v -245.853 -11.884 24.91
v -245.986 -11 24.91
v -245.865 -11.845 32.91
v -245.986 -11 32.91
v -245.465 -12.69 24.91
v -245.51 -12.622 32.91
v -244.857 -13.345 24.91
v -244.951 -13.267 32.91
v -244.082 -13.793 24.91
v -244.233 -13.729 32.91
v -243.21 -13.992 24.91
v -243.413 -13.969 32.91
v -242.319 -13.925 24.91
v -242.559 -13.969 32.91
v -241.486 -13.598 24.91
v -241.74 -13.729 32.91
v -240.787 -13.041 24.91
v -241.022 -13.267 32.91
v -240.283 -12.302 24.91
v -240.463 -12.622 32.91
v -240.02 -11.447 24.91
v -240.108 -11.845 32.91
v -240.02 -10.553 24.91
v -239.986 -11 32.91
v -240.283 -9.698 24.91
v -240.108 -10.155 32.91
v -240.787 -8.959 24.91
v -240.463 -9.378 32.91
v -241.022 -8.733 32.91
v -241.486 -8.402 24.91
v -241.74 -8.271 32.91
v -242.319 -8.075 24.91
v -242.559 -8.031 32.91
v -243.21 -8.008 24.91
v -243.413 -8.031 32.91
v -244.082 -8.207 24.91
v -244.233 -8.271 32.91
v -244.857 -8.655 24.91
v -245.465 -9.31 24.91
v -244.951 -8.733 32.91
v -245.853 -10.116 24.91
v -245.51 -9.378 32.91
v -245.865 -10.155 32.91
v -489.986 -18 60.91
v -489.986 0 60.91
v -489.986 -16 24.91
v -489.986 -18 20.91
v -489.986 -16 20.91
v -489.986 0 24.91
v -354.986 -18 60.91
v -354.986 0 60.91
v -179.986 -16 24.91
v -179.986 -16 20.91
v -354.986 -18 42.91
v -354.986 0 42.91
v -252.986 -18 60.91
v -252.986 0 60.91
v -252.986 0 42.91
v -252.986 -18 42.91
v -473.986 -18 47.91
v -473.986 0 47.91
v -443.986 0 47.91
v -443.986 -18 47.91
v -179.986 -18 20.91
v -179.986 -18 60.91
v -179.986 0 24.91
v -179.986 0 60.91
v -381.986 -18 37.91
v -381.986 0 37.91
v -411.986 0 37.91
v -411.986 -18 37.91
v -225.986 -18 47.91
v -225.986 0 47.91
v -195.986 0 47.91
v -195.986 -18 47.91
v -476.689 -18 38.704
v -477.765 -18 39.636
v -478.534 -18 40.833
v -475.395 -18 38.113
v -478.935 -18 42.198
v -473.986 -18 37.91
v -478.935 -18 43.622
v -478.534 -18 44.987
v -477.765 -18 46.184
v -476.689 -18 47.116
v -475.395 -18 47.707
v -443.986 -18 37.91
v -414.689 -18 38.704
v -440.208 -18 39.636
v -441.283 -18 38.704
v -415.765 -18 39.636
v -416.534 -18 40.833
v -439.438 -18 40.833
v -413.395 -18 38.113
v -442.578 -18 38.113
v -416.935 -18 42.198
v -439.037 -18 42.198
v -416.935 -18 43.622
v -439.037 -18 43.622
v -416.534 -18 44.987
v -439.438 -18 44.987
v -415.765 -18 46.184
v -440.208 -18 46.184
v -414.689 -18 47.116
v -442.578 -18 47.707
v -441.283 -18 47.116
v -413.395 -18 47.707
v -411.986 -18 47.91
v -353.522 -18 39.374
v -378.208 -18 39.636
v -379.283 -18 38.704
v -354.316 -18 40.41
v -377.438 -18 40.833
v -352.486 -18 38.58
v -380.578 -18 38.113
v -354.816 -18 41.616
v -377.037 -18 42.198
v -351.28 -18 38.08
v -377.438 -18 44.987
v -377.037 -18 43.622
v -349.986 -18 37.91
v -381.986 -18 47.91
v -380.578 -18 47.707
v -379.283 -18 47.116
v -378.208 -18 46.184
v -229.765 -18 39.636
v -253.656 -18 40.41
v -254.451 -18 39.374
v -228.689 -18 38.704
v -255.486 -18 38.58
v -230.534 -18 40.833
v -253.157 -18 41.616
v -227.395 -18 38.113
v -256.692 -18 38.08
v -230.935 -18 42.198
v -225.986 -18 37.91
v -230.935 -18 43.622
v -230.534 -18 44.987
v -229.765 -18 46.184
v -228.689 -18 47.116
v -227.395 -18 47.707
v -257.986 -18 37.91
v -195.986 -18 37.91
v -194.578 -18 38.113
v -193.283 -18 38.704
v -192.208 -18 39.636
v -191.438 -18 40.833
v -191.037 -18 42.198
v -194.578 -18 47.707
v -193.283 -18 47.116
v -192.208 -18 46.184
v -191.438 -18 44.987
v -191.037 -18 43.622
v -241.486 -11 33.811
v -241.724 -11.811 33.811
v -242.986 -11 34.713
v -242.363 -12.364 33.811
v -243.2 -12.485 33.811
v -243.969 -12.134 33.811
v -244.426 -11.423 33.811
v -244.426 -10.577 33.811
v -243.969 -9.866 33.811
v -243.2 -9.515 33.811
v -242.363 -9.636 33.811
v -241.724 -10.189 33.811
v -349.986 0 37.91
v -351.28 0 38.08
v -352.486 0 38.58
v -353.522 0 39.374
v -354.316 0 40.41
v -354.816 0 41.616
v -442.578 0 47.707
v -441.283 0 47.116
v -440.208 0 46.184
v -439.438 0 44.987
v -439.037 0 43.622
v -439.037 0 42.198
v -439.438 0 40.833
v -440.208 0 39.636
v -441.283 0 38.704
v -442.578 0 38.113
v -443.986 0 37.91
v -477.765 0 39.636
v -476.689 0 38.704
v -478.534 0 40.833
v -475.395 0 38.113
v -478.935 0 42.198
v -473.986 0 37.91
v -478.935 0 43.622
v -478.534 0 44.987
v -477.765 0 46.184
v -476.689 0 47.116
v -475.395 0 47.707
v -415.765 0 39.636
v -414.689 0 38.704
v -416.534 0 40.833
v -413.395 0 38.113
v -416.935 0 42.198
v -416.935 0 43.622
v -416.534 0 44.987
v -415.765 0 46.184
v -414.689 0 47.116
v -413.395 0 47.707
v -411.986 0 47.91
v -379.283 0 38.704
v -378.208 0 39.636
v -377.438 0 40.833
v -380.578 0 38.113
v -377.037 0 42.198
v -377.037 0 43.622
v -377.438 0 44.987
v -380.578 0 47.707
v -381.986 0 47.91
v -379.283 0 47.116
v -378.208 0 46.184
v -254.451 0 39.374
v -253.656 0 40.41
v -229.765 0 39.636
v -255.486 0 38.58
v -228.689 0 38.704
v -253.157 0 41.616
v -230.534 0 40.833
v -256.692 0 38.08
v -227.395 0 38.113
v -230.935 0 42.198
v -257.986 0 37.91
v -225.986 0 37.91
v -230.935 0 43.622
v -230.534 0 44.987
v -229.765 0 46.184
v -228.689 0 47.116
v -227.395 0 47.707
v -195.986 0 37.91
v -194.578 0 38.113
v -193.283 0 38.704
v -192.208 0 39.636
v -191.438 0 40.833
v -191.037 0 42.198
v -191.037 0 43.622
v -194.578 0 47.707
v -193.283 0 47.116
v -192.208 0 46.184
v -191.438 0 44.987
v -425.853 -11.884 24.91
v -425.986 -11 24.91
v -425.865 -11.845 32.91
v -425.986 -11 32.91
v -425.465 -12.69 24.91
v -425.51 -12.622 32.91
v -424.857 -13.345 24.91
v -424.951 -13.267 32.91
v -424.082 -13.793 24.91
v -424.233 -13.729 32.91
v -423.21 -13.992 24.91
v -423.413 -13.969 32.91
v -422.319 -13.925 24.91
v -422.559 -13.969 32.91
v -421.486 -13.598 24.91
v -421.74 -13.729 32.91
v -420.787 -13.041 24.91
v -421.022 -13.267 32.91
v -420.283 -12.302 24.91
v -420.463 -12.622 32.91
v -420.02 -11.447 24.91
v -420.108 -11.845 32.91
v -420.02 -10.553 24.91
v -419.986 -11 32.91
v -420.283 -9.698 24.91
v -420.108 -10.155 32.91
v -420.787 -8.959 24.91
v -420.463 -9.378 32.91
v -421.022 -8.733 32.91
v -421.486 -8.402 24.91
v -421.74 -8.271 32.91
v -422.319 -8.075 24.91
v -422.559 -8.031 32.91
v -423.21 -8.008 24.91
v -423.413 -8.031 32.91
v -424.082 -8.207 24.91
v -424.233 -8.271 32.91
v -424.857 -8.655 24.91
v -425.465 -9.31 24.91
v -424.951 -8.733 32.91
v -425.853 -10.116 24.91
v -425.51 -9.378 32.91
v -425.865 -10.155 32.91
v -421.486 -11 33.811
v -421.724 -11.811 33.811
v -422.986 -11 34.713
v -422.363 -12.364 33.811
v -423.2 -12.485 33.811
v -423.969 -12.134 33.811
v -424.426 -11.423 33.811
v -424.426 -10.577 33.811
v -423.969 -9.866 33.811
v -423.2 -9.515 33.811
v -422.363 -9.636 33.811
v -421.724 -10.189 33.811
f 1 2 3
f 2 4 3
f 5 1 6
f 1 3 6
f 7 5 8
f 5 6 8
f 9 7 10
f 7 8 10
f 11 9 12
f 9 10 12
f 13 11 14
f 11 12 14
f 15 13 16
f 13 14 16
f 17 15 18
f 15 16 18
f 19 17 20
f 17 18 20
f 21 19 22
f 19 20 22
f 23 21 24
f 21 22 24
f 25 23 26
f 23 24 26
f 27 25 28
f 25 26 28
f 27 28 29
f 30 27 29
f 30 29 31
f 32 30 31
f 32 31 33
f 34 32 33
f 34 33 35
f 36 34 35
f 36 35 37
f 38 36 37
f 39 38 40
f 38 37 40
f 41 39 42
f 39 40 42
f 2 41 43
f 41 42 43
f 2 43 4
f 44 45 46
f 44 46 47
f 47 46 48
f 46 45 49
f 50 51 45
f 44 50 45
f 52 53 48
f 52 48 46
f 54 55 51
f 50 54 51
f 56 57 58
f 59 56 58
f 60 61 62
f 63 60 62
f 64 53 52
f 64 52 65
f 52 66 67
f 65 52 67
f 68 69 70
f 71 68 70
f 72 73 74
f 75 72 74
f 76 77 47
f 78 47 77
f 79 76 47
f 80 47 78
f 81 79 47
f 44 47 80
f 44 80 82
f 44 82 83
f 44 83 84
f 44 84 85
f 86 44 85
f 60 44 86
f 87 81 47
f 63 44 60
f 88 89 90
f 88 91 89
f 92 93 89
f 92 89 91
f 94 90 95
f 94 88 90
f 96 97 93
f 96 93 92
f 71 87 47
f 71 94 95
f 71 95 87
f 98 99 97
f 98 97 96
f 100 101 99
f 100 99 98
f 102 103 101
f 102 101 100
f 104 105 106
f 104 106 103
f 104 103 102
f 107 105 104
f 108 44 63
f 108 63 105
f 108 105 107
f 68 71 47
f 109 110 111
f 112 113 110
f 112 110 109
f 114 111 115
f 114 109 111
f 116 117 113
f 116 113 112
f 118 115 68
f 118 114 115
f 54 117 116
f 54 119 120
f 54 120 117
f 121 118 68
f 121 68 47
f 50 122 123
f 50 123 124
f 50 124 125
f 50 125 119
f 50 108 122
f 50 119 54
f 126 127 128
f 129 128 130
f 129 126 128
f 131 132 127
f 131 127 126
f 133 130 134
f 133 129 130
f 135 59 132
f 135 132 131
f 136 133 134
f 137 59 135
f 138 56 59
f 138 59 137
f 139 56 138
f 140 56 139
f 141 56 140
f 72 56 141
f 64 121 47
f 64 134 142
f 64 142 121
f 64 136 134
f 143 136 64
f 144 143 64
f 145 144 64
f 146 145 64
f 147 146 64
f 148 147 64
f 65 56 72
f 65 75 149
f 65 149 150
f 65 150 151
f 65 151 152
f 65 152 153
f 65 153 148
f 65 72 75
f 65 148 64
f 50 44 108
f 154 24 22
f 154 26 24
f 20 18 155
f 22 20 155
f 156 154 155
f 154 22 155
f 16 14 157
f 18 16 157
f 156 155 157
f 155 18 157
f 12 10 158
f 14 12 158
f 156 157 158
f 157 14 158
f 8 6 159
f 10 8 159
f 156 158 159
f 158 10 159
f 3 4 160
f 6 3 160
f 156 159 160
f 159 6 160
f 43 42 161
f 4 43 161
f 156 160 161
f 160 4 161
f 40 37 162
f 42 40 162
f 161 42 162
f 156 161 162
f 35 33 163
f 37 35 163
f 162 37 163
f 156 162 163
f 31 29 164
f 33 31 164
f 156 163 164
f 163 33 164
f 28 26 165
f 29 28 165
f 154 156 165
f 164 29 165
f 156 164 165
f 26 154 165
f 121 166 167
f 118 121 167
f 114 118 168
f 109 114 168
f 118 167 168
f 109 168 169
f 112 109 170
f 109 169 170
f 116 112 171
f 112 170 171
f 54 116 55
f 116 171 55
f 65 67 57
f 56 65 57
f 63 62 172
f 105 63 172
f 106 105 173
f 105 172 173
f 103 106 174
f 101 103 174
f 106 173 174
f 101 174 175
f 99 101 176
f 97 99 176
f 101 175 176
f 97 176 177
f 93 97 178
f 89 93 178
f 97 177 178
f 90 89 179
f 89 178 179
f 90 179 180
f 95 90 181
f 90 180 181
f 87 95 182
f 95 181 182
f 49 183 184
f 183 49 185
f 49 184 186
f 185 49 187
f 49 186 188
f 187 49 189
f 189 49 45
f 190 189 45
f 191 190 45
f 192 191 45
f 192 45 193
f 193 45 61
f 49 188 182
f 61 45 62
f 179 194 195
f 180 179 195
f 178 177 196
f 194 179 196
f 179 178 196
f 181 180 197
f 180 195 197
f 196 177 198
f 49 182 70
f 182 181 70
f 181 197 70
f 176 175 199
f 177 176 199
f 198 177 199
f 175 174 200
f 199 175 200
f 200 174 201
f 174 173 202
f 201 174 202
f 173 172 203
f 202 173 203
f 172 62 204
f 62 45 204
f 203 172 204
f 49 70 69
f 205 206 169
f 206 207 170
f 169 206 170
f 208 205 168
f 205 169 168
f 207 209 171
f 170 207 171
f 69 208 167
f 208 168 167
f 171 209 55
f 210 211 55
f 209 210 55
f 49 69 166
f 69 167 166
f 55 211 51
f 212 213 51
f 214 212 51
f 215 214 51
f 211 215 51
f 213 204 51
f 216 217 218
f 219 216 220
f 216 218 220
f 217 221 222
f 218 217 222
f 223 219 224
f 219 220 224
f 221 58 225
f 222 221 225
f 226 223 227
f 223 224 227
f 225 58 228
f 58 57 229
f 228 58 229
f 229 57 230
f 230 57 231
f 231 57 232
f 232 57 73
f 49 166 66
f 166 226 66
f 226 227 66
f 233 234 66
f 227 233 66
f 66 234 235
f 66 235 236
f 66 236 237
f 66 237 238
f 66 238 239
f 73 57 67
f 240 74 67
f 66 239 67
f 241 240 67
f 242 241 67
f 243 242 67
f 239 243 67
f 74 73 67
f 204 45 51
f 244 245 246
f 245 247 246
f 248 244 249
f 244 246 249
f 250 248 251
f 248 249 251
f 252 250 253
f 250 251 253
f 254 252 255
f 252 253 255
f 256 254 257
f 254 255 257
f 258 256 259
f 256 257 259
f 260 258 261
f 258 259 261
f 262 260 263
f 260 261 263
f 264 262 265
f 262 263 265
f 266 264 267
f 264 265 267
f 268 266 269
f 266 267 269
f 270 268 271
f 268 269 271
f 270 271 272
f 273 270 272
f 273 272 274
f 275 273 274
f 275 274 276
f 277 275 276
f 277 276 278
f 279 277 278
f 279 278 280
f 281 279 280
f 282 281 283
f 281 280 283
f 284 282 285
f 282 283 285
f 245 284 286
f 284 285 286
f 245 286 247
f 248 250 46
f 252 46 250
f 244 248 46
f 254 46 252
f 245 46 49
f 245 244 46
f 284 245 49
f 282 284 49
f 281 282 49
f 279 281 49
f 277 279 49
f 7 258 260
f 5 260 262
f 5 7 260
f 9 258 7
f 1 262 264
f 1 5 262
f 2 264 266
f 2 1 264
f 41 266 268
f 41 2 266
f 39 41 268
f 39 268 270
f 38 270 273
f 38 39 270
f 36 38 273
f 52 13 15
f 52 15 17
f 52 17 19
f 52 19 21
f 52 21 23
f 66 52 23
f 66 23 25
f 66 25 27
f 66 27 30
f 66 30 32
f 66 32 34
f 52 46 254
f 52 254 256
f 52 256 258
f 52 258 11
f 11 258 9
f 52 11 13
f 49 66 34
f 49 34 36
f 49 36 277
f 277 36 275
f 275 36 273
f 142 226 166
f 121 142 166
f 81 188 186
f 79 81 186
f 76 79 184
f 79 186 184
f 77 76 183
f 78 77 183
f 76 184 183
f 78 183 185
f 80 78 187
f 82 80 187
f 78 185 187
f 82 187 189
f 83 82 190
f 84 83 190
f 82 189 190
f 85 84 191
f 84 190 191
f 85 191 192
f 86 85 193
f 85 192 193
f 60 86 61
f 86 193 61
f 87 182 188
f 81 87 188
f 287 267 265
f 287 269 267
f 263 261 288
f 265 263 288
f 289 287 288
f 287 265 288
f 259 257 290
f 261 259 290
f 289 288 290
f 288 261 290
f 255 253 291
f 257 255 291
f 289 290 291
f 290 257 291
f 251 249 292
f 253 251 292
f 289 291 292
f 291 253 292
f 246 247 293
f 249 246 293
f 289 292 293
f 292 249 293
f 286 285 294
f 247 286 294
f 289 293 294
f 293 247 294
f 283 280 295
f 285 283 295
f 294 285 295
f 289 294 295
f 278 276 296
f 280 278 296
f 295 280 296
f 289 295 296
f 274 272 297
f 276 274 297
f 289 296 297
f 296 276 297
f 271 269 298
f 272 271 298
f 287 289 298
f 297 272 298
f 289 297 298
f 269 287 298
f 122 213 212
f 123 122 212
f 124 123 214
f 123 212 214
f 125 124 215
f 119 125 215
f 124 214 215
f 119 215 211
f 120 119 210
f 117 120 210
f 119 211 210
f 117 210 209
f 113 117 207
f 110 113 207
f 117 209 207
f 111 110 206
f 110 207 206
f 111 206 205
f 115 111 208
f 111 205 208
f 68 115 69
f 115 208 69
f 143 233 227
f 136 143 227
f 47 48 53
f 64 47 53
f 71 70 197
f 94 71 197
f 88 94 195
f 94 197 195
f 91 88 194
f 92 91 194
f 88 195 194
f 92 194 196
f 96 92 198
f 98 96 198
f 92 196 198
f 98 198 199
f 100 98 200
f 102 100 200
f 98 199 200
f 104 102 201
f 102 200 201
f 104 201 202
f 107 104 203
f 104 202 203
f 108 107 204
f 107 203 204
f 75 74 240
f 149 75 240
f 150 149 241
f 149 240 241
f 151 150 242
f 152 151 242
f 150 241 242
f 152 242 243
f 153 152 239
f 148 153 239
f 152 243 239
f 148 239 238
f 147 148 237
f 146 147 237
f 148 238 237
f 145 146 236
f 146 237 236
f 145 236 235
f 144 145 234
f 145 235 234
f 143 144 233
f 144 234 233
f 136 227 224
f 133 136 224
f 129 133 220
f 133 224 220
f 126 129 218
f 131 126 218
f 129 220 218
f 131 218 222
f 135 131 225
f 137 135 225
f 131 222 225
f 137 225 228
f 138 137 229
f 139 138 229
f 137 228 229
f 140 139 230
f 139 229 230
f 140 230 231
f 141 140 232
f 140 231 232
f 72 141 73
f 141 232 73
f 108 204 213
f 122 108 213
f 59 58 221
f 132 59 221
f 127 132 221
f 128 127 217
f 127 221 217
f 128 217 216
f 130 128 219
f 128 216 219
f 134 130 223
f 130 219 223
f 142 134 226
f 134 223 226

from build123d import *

# Parameters (mm, degrees)
F1_DEPTH = 18
F2_W     = 16
F2_H     = 4
F3_DEPTH = 400
F5_D     = 6
F5_DEPTH = 8
F5_TIP   = 1.8025818571


with BuildPart() as f1:
    # F0 (on Front) → F1 (new body)
    with BuildSketch(Plane.XZ):
        with BuildLine():
            Line((-489.9862787309, 20.9100212359), (-179.9862787309, 20.9100212359))
            Line((-179.9862787309, 20.9100212359), (-179.9862787309, 60.9100212359))
            Line((-179.9862787309, 60.9100212359), (-252.9862787309, 60.9100212359))
            Line((-252.9862787309, 60.9100212359), (-252.9862787309, 42.9100212359))
            ThreePointArc((-252.9862787309, 42.9100212359), (-254.450744825, 39.37448733), (-257.9862787309, 37.9100212359))
            Line((-257.9862787309, 37.9100212359), (-349.9862787309, 37.9100212359))
            ThreePointArc((-349.9862787309, 37.9100212359), (-353.5218126368, 39.37448733), (-354.9862787309, 42.9100212359))
            Line((-354.9862787309, 42.9100212359), (-354.9862787309, 60.9100212359))
            Line((-354.9862787309, 60.9100212359), (-489.9862787309, 60.9100212359))
            Line((-489.9862787309, 60.9100212359), (-489.9862787309, 20.9100212359))
        make_face()
        with BuildLine():
            Line((-443.9862787309, 37.9100212359), (-473.9862787309, 37.9100212359))
            ThreePointArc((-473.9862787309, 37.9100212359), (-478.9862787309, 42.9100212359), (-473.9862787309, 47.9100212359))
            Line((-473.9862787309, 47.9100212359), (-443.9862787309, 47.9100212359))
            ThreePointArc((-443.9862787309, 47.9100212359), (-438.9862787309, 42.9100212359), (-443.9862787309, 37.9100212359))
        make_face(mode=Mode.SUBTRACT)
        with BuildLine():
            Line((-381.9862787309, 37.9100212359), (-411.9862787309, 37.9100212359))
            ThreePointArc((-411.9862787309, 37.9100212359), (-416.9862787309, 42.9100212359), (-411.9862787309, 47.9100212359))
            Line((-411.9862787309, 47.9100212359), (-381.9862787309, 47.9100212359))
            ThreePointArc((-381.9862787309, 47.9100212359), (-376.9862787309, 42.9100212359), (-381.9862787309, 37.9100212359))
        make_face(mode=Mode.SUBTRACT)
        with BuildLine():
            Line((-195.9862787309, 37.9100212359), (-225.9862787309, 37.9100212359))
            ThreePointArc((-225.9862787309, 37.9100212359), (-230.9862787309, 42.9100212359), (-225.9862787309, 47.9100212359))
            Line((-225.9862787309, 47.9100212359), (-195.9862787309, 47.9100212359))
            ThreePointArc((-195.9862787309, 47.9100212359), (-190.9862787309, 42.9100212359), (-195.9862787309, 37.9100212359))
        make_face(mode=Mode.SUBTRACT)
    extrude(amount=F1_DEPTH)

    # F2 (on face) → F3 (cut)
    with BuildSketch(Plane.YZ.offset(-179.9862787309)):
        with Locations((-8, 22.9100212359)):
            Rectangle(F2_W, F2_H)
    extrude(amount=-F3_DEPTH, mode=Mode.SUBTRACT)

    # F5
    with Locations(Plane(origin=(0, 0, 24.9100212359), x_dir=(1, 0, 0), z_dir=(0, 0, -1))):
        with Locations((-242.9862787309, 11), (-422.9862787309, 11)):
            Hole(F5_D / 2, depth=F5_DEPTH)
            with Locations((0, 0, -(F5_DEPTH + F5_TIP / 2))):  # 118° drill point
                Cone(0, F5_D / 2, F5_TIP, mode=Mode.SUBTRACT)


solid = f1.part
